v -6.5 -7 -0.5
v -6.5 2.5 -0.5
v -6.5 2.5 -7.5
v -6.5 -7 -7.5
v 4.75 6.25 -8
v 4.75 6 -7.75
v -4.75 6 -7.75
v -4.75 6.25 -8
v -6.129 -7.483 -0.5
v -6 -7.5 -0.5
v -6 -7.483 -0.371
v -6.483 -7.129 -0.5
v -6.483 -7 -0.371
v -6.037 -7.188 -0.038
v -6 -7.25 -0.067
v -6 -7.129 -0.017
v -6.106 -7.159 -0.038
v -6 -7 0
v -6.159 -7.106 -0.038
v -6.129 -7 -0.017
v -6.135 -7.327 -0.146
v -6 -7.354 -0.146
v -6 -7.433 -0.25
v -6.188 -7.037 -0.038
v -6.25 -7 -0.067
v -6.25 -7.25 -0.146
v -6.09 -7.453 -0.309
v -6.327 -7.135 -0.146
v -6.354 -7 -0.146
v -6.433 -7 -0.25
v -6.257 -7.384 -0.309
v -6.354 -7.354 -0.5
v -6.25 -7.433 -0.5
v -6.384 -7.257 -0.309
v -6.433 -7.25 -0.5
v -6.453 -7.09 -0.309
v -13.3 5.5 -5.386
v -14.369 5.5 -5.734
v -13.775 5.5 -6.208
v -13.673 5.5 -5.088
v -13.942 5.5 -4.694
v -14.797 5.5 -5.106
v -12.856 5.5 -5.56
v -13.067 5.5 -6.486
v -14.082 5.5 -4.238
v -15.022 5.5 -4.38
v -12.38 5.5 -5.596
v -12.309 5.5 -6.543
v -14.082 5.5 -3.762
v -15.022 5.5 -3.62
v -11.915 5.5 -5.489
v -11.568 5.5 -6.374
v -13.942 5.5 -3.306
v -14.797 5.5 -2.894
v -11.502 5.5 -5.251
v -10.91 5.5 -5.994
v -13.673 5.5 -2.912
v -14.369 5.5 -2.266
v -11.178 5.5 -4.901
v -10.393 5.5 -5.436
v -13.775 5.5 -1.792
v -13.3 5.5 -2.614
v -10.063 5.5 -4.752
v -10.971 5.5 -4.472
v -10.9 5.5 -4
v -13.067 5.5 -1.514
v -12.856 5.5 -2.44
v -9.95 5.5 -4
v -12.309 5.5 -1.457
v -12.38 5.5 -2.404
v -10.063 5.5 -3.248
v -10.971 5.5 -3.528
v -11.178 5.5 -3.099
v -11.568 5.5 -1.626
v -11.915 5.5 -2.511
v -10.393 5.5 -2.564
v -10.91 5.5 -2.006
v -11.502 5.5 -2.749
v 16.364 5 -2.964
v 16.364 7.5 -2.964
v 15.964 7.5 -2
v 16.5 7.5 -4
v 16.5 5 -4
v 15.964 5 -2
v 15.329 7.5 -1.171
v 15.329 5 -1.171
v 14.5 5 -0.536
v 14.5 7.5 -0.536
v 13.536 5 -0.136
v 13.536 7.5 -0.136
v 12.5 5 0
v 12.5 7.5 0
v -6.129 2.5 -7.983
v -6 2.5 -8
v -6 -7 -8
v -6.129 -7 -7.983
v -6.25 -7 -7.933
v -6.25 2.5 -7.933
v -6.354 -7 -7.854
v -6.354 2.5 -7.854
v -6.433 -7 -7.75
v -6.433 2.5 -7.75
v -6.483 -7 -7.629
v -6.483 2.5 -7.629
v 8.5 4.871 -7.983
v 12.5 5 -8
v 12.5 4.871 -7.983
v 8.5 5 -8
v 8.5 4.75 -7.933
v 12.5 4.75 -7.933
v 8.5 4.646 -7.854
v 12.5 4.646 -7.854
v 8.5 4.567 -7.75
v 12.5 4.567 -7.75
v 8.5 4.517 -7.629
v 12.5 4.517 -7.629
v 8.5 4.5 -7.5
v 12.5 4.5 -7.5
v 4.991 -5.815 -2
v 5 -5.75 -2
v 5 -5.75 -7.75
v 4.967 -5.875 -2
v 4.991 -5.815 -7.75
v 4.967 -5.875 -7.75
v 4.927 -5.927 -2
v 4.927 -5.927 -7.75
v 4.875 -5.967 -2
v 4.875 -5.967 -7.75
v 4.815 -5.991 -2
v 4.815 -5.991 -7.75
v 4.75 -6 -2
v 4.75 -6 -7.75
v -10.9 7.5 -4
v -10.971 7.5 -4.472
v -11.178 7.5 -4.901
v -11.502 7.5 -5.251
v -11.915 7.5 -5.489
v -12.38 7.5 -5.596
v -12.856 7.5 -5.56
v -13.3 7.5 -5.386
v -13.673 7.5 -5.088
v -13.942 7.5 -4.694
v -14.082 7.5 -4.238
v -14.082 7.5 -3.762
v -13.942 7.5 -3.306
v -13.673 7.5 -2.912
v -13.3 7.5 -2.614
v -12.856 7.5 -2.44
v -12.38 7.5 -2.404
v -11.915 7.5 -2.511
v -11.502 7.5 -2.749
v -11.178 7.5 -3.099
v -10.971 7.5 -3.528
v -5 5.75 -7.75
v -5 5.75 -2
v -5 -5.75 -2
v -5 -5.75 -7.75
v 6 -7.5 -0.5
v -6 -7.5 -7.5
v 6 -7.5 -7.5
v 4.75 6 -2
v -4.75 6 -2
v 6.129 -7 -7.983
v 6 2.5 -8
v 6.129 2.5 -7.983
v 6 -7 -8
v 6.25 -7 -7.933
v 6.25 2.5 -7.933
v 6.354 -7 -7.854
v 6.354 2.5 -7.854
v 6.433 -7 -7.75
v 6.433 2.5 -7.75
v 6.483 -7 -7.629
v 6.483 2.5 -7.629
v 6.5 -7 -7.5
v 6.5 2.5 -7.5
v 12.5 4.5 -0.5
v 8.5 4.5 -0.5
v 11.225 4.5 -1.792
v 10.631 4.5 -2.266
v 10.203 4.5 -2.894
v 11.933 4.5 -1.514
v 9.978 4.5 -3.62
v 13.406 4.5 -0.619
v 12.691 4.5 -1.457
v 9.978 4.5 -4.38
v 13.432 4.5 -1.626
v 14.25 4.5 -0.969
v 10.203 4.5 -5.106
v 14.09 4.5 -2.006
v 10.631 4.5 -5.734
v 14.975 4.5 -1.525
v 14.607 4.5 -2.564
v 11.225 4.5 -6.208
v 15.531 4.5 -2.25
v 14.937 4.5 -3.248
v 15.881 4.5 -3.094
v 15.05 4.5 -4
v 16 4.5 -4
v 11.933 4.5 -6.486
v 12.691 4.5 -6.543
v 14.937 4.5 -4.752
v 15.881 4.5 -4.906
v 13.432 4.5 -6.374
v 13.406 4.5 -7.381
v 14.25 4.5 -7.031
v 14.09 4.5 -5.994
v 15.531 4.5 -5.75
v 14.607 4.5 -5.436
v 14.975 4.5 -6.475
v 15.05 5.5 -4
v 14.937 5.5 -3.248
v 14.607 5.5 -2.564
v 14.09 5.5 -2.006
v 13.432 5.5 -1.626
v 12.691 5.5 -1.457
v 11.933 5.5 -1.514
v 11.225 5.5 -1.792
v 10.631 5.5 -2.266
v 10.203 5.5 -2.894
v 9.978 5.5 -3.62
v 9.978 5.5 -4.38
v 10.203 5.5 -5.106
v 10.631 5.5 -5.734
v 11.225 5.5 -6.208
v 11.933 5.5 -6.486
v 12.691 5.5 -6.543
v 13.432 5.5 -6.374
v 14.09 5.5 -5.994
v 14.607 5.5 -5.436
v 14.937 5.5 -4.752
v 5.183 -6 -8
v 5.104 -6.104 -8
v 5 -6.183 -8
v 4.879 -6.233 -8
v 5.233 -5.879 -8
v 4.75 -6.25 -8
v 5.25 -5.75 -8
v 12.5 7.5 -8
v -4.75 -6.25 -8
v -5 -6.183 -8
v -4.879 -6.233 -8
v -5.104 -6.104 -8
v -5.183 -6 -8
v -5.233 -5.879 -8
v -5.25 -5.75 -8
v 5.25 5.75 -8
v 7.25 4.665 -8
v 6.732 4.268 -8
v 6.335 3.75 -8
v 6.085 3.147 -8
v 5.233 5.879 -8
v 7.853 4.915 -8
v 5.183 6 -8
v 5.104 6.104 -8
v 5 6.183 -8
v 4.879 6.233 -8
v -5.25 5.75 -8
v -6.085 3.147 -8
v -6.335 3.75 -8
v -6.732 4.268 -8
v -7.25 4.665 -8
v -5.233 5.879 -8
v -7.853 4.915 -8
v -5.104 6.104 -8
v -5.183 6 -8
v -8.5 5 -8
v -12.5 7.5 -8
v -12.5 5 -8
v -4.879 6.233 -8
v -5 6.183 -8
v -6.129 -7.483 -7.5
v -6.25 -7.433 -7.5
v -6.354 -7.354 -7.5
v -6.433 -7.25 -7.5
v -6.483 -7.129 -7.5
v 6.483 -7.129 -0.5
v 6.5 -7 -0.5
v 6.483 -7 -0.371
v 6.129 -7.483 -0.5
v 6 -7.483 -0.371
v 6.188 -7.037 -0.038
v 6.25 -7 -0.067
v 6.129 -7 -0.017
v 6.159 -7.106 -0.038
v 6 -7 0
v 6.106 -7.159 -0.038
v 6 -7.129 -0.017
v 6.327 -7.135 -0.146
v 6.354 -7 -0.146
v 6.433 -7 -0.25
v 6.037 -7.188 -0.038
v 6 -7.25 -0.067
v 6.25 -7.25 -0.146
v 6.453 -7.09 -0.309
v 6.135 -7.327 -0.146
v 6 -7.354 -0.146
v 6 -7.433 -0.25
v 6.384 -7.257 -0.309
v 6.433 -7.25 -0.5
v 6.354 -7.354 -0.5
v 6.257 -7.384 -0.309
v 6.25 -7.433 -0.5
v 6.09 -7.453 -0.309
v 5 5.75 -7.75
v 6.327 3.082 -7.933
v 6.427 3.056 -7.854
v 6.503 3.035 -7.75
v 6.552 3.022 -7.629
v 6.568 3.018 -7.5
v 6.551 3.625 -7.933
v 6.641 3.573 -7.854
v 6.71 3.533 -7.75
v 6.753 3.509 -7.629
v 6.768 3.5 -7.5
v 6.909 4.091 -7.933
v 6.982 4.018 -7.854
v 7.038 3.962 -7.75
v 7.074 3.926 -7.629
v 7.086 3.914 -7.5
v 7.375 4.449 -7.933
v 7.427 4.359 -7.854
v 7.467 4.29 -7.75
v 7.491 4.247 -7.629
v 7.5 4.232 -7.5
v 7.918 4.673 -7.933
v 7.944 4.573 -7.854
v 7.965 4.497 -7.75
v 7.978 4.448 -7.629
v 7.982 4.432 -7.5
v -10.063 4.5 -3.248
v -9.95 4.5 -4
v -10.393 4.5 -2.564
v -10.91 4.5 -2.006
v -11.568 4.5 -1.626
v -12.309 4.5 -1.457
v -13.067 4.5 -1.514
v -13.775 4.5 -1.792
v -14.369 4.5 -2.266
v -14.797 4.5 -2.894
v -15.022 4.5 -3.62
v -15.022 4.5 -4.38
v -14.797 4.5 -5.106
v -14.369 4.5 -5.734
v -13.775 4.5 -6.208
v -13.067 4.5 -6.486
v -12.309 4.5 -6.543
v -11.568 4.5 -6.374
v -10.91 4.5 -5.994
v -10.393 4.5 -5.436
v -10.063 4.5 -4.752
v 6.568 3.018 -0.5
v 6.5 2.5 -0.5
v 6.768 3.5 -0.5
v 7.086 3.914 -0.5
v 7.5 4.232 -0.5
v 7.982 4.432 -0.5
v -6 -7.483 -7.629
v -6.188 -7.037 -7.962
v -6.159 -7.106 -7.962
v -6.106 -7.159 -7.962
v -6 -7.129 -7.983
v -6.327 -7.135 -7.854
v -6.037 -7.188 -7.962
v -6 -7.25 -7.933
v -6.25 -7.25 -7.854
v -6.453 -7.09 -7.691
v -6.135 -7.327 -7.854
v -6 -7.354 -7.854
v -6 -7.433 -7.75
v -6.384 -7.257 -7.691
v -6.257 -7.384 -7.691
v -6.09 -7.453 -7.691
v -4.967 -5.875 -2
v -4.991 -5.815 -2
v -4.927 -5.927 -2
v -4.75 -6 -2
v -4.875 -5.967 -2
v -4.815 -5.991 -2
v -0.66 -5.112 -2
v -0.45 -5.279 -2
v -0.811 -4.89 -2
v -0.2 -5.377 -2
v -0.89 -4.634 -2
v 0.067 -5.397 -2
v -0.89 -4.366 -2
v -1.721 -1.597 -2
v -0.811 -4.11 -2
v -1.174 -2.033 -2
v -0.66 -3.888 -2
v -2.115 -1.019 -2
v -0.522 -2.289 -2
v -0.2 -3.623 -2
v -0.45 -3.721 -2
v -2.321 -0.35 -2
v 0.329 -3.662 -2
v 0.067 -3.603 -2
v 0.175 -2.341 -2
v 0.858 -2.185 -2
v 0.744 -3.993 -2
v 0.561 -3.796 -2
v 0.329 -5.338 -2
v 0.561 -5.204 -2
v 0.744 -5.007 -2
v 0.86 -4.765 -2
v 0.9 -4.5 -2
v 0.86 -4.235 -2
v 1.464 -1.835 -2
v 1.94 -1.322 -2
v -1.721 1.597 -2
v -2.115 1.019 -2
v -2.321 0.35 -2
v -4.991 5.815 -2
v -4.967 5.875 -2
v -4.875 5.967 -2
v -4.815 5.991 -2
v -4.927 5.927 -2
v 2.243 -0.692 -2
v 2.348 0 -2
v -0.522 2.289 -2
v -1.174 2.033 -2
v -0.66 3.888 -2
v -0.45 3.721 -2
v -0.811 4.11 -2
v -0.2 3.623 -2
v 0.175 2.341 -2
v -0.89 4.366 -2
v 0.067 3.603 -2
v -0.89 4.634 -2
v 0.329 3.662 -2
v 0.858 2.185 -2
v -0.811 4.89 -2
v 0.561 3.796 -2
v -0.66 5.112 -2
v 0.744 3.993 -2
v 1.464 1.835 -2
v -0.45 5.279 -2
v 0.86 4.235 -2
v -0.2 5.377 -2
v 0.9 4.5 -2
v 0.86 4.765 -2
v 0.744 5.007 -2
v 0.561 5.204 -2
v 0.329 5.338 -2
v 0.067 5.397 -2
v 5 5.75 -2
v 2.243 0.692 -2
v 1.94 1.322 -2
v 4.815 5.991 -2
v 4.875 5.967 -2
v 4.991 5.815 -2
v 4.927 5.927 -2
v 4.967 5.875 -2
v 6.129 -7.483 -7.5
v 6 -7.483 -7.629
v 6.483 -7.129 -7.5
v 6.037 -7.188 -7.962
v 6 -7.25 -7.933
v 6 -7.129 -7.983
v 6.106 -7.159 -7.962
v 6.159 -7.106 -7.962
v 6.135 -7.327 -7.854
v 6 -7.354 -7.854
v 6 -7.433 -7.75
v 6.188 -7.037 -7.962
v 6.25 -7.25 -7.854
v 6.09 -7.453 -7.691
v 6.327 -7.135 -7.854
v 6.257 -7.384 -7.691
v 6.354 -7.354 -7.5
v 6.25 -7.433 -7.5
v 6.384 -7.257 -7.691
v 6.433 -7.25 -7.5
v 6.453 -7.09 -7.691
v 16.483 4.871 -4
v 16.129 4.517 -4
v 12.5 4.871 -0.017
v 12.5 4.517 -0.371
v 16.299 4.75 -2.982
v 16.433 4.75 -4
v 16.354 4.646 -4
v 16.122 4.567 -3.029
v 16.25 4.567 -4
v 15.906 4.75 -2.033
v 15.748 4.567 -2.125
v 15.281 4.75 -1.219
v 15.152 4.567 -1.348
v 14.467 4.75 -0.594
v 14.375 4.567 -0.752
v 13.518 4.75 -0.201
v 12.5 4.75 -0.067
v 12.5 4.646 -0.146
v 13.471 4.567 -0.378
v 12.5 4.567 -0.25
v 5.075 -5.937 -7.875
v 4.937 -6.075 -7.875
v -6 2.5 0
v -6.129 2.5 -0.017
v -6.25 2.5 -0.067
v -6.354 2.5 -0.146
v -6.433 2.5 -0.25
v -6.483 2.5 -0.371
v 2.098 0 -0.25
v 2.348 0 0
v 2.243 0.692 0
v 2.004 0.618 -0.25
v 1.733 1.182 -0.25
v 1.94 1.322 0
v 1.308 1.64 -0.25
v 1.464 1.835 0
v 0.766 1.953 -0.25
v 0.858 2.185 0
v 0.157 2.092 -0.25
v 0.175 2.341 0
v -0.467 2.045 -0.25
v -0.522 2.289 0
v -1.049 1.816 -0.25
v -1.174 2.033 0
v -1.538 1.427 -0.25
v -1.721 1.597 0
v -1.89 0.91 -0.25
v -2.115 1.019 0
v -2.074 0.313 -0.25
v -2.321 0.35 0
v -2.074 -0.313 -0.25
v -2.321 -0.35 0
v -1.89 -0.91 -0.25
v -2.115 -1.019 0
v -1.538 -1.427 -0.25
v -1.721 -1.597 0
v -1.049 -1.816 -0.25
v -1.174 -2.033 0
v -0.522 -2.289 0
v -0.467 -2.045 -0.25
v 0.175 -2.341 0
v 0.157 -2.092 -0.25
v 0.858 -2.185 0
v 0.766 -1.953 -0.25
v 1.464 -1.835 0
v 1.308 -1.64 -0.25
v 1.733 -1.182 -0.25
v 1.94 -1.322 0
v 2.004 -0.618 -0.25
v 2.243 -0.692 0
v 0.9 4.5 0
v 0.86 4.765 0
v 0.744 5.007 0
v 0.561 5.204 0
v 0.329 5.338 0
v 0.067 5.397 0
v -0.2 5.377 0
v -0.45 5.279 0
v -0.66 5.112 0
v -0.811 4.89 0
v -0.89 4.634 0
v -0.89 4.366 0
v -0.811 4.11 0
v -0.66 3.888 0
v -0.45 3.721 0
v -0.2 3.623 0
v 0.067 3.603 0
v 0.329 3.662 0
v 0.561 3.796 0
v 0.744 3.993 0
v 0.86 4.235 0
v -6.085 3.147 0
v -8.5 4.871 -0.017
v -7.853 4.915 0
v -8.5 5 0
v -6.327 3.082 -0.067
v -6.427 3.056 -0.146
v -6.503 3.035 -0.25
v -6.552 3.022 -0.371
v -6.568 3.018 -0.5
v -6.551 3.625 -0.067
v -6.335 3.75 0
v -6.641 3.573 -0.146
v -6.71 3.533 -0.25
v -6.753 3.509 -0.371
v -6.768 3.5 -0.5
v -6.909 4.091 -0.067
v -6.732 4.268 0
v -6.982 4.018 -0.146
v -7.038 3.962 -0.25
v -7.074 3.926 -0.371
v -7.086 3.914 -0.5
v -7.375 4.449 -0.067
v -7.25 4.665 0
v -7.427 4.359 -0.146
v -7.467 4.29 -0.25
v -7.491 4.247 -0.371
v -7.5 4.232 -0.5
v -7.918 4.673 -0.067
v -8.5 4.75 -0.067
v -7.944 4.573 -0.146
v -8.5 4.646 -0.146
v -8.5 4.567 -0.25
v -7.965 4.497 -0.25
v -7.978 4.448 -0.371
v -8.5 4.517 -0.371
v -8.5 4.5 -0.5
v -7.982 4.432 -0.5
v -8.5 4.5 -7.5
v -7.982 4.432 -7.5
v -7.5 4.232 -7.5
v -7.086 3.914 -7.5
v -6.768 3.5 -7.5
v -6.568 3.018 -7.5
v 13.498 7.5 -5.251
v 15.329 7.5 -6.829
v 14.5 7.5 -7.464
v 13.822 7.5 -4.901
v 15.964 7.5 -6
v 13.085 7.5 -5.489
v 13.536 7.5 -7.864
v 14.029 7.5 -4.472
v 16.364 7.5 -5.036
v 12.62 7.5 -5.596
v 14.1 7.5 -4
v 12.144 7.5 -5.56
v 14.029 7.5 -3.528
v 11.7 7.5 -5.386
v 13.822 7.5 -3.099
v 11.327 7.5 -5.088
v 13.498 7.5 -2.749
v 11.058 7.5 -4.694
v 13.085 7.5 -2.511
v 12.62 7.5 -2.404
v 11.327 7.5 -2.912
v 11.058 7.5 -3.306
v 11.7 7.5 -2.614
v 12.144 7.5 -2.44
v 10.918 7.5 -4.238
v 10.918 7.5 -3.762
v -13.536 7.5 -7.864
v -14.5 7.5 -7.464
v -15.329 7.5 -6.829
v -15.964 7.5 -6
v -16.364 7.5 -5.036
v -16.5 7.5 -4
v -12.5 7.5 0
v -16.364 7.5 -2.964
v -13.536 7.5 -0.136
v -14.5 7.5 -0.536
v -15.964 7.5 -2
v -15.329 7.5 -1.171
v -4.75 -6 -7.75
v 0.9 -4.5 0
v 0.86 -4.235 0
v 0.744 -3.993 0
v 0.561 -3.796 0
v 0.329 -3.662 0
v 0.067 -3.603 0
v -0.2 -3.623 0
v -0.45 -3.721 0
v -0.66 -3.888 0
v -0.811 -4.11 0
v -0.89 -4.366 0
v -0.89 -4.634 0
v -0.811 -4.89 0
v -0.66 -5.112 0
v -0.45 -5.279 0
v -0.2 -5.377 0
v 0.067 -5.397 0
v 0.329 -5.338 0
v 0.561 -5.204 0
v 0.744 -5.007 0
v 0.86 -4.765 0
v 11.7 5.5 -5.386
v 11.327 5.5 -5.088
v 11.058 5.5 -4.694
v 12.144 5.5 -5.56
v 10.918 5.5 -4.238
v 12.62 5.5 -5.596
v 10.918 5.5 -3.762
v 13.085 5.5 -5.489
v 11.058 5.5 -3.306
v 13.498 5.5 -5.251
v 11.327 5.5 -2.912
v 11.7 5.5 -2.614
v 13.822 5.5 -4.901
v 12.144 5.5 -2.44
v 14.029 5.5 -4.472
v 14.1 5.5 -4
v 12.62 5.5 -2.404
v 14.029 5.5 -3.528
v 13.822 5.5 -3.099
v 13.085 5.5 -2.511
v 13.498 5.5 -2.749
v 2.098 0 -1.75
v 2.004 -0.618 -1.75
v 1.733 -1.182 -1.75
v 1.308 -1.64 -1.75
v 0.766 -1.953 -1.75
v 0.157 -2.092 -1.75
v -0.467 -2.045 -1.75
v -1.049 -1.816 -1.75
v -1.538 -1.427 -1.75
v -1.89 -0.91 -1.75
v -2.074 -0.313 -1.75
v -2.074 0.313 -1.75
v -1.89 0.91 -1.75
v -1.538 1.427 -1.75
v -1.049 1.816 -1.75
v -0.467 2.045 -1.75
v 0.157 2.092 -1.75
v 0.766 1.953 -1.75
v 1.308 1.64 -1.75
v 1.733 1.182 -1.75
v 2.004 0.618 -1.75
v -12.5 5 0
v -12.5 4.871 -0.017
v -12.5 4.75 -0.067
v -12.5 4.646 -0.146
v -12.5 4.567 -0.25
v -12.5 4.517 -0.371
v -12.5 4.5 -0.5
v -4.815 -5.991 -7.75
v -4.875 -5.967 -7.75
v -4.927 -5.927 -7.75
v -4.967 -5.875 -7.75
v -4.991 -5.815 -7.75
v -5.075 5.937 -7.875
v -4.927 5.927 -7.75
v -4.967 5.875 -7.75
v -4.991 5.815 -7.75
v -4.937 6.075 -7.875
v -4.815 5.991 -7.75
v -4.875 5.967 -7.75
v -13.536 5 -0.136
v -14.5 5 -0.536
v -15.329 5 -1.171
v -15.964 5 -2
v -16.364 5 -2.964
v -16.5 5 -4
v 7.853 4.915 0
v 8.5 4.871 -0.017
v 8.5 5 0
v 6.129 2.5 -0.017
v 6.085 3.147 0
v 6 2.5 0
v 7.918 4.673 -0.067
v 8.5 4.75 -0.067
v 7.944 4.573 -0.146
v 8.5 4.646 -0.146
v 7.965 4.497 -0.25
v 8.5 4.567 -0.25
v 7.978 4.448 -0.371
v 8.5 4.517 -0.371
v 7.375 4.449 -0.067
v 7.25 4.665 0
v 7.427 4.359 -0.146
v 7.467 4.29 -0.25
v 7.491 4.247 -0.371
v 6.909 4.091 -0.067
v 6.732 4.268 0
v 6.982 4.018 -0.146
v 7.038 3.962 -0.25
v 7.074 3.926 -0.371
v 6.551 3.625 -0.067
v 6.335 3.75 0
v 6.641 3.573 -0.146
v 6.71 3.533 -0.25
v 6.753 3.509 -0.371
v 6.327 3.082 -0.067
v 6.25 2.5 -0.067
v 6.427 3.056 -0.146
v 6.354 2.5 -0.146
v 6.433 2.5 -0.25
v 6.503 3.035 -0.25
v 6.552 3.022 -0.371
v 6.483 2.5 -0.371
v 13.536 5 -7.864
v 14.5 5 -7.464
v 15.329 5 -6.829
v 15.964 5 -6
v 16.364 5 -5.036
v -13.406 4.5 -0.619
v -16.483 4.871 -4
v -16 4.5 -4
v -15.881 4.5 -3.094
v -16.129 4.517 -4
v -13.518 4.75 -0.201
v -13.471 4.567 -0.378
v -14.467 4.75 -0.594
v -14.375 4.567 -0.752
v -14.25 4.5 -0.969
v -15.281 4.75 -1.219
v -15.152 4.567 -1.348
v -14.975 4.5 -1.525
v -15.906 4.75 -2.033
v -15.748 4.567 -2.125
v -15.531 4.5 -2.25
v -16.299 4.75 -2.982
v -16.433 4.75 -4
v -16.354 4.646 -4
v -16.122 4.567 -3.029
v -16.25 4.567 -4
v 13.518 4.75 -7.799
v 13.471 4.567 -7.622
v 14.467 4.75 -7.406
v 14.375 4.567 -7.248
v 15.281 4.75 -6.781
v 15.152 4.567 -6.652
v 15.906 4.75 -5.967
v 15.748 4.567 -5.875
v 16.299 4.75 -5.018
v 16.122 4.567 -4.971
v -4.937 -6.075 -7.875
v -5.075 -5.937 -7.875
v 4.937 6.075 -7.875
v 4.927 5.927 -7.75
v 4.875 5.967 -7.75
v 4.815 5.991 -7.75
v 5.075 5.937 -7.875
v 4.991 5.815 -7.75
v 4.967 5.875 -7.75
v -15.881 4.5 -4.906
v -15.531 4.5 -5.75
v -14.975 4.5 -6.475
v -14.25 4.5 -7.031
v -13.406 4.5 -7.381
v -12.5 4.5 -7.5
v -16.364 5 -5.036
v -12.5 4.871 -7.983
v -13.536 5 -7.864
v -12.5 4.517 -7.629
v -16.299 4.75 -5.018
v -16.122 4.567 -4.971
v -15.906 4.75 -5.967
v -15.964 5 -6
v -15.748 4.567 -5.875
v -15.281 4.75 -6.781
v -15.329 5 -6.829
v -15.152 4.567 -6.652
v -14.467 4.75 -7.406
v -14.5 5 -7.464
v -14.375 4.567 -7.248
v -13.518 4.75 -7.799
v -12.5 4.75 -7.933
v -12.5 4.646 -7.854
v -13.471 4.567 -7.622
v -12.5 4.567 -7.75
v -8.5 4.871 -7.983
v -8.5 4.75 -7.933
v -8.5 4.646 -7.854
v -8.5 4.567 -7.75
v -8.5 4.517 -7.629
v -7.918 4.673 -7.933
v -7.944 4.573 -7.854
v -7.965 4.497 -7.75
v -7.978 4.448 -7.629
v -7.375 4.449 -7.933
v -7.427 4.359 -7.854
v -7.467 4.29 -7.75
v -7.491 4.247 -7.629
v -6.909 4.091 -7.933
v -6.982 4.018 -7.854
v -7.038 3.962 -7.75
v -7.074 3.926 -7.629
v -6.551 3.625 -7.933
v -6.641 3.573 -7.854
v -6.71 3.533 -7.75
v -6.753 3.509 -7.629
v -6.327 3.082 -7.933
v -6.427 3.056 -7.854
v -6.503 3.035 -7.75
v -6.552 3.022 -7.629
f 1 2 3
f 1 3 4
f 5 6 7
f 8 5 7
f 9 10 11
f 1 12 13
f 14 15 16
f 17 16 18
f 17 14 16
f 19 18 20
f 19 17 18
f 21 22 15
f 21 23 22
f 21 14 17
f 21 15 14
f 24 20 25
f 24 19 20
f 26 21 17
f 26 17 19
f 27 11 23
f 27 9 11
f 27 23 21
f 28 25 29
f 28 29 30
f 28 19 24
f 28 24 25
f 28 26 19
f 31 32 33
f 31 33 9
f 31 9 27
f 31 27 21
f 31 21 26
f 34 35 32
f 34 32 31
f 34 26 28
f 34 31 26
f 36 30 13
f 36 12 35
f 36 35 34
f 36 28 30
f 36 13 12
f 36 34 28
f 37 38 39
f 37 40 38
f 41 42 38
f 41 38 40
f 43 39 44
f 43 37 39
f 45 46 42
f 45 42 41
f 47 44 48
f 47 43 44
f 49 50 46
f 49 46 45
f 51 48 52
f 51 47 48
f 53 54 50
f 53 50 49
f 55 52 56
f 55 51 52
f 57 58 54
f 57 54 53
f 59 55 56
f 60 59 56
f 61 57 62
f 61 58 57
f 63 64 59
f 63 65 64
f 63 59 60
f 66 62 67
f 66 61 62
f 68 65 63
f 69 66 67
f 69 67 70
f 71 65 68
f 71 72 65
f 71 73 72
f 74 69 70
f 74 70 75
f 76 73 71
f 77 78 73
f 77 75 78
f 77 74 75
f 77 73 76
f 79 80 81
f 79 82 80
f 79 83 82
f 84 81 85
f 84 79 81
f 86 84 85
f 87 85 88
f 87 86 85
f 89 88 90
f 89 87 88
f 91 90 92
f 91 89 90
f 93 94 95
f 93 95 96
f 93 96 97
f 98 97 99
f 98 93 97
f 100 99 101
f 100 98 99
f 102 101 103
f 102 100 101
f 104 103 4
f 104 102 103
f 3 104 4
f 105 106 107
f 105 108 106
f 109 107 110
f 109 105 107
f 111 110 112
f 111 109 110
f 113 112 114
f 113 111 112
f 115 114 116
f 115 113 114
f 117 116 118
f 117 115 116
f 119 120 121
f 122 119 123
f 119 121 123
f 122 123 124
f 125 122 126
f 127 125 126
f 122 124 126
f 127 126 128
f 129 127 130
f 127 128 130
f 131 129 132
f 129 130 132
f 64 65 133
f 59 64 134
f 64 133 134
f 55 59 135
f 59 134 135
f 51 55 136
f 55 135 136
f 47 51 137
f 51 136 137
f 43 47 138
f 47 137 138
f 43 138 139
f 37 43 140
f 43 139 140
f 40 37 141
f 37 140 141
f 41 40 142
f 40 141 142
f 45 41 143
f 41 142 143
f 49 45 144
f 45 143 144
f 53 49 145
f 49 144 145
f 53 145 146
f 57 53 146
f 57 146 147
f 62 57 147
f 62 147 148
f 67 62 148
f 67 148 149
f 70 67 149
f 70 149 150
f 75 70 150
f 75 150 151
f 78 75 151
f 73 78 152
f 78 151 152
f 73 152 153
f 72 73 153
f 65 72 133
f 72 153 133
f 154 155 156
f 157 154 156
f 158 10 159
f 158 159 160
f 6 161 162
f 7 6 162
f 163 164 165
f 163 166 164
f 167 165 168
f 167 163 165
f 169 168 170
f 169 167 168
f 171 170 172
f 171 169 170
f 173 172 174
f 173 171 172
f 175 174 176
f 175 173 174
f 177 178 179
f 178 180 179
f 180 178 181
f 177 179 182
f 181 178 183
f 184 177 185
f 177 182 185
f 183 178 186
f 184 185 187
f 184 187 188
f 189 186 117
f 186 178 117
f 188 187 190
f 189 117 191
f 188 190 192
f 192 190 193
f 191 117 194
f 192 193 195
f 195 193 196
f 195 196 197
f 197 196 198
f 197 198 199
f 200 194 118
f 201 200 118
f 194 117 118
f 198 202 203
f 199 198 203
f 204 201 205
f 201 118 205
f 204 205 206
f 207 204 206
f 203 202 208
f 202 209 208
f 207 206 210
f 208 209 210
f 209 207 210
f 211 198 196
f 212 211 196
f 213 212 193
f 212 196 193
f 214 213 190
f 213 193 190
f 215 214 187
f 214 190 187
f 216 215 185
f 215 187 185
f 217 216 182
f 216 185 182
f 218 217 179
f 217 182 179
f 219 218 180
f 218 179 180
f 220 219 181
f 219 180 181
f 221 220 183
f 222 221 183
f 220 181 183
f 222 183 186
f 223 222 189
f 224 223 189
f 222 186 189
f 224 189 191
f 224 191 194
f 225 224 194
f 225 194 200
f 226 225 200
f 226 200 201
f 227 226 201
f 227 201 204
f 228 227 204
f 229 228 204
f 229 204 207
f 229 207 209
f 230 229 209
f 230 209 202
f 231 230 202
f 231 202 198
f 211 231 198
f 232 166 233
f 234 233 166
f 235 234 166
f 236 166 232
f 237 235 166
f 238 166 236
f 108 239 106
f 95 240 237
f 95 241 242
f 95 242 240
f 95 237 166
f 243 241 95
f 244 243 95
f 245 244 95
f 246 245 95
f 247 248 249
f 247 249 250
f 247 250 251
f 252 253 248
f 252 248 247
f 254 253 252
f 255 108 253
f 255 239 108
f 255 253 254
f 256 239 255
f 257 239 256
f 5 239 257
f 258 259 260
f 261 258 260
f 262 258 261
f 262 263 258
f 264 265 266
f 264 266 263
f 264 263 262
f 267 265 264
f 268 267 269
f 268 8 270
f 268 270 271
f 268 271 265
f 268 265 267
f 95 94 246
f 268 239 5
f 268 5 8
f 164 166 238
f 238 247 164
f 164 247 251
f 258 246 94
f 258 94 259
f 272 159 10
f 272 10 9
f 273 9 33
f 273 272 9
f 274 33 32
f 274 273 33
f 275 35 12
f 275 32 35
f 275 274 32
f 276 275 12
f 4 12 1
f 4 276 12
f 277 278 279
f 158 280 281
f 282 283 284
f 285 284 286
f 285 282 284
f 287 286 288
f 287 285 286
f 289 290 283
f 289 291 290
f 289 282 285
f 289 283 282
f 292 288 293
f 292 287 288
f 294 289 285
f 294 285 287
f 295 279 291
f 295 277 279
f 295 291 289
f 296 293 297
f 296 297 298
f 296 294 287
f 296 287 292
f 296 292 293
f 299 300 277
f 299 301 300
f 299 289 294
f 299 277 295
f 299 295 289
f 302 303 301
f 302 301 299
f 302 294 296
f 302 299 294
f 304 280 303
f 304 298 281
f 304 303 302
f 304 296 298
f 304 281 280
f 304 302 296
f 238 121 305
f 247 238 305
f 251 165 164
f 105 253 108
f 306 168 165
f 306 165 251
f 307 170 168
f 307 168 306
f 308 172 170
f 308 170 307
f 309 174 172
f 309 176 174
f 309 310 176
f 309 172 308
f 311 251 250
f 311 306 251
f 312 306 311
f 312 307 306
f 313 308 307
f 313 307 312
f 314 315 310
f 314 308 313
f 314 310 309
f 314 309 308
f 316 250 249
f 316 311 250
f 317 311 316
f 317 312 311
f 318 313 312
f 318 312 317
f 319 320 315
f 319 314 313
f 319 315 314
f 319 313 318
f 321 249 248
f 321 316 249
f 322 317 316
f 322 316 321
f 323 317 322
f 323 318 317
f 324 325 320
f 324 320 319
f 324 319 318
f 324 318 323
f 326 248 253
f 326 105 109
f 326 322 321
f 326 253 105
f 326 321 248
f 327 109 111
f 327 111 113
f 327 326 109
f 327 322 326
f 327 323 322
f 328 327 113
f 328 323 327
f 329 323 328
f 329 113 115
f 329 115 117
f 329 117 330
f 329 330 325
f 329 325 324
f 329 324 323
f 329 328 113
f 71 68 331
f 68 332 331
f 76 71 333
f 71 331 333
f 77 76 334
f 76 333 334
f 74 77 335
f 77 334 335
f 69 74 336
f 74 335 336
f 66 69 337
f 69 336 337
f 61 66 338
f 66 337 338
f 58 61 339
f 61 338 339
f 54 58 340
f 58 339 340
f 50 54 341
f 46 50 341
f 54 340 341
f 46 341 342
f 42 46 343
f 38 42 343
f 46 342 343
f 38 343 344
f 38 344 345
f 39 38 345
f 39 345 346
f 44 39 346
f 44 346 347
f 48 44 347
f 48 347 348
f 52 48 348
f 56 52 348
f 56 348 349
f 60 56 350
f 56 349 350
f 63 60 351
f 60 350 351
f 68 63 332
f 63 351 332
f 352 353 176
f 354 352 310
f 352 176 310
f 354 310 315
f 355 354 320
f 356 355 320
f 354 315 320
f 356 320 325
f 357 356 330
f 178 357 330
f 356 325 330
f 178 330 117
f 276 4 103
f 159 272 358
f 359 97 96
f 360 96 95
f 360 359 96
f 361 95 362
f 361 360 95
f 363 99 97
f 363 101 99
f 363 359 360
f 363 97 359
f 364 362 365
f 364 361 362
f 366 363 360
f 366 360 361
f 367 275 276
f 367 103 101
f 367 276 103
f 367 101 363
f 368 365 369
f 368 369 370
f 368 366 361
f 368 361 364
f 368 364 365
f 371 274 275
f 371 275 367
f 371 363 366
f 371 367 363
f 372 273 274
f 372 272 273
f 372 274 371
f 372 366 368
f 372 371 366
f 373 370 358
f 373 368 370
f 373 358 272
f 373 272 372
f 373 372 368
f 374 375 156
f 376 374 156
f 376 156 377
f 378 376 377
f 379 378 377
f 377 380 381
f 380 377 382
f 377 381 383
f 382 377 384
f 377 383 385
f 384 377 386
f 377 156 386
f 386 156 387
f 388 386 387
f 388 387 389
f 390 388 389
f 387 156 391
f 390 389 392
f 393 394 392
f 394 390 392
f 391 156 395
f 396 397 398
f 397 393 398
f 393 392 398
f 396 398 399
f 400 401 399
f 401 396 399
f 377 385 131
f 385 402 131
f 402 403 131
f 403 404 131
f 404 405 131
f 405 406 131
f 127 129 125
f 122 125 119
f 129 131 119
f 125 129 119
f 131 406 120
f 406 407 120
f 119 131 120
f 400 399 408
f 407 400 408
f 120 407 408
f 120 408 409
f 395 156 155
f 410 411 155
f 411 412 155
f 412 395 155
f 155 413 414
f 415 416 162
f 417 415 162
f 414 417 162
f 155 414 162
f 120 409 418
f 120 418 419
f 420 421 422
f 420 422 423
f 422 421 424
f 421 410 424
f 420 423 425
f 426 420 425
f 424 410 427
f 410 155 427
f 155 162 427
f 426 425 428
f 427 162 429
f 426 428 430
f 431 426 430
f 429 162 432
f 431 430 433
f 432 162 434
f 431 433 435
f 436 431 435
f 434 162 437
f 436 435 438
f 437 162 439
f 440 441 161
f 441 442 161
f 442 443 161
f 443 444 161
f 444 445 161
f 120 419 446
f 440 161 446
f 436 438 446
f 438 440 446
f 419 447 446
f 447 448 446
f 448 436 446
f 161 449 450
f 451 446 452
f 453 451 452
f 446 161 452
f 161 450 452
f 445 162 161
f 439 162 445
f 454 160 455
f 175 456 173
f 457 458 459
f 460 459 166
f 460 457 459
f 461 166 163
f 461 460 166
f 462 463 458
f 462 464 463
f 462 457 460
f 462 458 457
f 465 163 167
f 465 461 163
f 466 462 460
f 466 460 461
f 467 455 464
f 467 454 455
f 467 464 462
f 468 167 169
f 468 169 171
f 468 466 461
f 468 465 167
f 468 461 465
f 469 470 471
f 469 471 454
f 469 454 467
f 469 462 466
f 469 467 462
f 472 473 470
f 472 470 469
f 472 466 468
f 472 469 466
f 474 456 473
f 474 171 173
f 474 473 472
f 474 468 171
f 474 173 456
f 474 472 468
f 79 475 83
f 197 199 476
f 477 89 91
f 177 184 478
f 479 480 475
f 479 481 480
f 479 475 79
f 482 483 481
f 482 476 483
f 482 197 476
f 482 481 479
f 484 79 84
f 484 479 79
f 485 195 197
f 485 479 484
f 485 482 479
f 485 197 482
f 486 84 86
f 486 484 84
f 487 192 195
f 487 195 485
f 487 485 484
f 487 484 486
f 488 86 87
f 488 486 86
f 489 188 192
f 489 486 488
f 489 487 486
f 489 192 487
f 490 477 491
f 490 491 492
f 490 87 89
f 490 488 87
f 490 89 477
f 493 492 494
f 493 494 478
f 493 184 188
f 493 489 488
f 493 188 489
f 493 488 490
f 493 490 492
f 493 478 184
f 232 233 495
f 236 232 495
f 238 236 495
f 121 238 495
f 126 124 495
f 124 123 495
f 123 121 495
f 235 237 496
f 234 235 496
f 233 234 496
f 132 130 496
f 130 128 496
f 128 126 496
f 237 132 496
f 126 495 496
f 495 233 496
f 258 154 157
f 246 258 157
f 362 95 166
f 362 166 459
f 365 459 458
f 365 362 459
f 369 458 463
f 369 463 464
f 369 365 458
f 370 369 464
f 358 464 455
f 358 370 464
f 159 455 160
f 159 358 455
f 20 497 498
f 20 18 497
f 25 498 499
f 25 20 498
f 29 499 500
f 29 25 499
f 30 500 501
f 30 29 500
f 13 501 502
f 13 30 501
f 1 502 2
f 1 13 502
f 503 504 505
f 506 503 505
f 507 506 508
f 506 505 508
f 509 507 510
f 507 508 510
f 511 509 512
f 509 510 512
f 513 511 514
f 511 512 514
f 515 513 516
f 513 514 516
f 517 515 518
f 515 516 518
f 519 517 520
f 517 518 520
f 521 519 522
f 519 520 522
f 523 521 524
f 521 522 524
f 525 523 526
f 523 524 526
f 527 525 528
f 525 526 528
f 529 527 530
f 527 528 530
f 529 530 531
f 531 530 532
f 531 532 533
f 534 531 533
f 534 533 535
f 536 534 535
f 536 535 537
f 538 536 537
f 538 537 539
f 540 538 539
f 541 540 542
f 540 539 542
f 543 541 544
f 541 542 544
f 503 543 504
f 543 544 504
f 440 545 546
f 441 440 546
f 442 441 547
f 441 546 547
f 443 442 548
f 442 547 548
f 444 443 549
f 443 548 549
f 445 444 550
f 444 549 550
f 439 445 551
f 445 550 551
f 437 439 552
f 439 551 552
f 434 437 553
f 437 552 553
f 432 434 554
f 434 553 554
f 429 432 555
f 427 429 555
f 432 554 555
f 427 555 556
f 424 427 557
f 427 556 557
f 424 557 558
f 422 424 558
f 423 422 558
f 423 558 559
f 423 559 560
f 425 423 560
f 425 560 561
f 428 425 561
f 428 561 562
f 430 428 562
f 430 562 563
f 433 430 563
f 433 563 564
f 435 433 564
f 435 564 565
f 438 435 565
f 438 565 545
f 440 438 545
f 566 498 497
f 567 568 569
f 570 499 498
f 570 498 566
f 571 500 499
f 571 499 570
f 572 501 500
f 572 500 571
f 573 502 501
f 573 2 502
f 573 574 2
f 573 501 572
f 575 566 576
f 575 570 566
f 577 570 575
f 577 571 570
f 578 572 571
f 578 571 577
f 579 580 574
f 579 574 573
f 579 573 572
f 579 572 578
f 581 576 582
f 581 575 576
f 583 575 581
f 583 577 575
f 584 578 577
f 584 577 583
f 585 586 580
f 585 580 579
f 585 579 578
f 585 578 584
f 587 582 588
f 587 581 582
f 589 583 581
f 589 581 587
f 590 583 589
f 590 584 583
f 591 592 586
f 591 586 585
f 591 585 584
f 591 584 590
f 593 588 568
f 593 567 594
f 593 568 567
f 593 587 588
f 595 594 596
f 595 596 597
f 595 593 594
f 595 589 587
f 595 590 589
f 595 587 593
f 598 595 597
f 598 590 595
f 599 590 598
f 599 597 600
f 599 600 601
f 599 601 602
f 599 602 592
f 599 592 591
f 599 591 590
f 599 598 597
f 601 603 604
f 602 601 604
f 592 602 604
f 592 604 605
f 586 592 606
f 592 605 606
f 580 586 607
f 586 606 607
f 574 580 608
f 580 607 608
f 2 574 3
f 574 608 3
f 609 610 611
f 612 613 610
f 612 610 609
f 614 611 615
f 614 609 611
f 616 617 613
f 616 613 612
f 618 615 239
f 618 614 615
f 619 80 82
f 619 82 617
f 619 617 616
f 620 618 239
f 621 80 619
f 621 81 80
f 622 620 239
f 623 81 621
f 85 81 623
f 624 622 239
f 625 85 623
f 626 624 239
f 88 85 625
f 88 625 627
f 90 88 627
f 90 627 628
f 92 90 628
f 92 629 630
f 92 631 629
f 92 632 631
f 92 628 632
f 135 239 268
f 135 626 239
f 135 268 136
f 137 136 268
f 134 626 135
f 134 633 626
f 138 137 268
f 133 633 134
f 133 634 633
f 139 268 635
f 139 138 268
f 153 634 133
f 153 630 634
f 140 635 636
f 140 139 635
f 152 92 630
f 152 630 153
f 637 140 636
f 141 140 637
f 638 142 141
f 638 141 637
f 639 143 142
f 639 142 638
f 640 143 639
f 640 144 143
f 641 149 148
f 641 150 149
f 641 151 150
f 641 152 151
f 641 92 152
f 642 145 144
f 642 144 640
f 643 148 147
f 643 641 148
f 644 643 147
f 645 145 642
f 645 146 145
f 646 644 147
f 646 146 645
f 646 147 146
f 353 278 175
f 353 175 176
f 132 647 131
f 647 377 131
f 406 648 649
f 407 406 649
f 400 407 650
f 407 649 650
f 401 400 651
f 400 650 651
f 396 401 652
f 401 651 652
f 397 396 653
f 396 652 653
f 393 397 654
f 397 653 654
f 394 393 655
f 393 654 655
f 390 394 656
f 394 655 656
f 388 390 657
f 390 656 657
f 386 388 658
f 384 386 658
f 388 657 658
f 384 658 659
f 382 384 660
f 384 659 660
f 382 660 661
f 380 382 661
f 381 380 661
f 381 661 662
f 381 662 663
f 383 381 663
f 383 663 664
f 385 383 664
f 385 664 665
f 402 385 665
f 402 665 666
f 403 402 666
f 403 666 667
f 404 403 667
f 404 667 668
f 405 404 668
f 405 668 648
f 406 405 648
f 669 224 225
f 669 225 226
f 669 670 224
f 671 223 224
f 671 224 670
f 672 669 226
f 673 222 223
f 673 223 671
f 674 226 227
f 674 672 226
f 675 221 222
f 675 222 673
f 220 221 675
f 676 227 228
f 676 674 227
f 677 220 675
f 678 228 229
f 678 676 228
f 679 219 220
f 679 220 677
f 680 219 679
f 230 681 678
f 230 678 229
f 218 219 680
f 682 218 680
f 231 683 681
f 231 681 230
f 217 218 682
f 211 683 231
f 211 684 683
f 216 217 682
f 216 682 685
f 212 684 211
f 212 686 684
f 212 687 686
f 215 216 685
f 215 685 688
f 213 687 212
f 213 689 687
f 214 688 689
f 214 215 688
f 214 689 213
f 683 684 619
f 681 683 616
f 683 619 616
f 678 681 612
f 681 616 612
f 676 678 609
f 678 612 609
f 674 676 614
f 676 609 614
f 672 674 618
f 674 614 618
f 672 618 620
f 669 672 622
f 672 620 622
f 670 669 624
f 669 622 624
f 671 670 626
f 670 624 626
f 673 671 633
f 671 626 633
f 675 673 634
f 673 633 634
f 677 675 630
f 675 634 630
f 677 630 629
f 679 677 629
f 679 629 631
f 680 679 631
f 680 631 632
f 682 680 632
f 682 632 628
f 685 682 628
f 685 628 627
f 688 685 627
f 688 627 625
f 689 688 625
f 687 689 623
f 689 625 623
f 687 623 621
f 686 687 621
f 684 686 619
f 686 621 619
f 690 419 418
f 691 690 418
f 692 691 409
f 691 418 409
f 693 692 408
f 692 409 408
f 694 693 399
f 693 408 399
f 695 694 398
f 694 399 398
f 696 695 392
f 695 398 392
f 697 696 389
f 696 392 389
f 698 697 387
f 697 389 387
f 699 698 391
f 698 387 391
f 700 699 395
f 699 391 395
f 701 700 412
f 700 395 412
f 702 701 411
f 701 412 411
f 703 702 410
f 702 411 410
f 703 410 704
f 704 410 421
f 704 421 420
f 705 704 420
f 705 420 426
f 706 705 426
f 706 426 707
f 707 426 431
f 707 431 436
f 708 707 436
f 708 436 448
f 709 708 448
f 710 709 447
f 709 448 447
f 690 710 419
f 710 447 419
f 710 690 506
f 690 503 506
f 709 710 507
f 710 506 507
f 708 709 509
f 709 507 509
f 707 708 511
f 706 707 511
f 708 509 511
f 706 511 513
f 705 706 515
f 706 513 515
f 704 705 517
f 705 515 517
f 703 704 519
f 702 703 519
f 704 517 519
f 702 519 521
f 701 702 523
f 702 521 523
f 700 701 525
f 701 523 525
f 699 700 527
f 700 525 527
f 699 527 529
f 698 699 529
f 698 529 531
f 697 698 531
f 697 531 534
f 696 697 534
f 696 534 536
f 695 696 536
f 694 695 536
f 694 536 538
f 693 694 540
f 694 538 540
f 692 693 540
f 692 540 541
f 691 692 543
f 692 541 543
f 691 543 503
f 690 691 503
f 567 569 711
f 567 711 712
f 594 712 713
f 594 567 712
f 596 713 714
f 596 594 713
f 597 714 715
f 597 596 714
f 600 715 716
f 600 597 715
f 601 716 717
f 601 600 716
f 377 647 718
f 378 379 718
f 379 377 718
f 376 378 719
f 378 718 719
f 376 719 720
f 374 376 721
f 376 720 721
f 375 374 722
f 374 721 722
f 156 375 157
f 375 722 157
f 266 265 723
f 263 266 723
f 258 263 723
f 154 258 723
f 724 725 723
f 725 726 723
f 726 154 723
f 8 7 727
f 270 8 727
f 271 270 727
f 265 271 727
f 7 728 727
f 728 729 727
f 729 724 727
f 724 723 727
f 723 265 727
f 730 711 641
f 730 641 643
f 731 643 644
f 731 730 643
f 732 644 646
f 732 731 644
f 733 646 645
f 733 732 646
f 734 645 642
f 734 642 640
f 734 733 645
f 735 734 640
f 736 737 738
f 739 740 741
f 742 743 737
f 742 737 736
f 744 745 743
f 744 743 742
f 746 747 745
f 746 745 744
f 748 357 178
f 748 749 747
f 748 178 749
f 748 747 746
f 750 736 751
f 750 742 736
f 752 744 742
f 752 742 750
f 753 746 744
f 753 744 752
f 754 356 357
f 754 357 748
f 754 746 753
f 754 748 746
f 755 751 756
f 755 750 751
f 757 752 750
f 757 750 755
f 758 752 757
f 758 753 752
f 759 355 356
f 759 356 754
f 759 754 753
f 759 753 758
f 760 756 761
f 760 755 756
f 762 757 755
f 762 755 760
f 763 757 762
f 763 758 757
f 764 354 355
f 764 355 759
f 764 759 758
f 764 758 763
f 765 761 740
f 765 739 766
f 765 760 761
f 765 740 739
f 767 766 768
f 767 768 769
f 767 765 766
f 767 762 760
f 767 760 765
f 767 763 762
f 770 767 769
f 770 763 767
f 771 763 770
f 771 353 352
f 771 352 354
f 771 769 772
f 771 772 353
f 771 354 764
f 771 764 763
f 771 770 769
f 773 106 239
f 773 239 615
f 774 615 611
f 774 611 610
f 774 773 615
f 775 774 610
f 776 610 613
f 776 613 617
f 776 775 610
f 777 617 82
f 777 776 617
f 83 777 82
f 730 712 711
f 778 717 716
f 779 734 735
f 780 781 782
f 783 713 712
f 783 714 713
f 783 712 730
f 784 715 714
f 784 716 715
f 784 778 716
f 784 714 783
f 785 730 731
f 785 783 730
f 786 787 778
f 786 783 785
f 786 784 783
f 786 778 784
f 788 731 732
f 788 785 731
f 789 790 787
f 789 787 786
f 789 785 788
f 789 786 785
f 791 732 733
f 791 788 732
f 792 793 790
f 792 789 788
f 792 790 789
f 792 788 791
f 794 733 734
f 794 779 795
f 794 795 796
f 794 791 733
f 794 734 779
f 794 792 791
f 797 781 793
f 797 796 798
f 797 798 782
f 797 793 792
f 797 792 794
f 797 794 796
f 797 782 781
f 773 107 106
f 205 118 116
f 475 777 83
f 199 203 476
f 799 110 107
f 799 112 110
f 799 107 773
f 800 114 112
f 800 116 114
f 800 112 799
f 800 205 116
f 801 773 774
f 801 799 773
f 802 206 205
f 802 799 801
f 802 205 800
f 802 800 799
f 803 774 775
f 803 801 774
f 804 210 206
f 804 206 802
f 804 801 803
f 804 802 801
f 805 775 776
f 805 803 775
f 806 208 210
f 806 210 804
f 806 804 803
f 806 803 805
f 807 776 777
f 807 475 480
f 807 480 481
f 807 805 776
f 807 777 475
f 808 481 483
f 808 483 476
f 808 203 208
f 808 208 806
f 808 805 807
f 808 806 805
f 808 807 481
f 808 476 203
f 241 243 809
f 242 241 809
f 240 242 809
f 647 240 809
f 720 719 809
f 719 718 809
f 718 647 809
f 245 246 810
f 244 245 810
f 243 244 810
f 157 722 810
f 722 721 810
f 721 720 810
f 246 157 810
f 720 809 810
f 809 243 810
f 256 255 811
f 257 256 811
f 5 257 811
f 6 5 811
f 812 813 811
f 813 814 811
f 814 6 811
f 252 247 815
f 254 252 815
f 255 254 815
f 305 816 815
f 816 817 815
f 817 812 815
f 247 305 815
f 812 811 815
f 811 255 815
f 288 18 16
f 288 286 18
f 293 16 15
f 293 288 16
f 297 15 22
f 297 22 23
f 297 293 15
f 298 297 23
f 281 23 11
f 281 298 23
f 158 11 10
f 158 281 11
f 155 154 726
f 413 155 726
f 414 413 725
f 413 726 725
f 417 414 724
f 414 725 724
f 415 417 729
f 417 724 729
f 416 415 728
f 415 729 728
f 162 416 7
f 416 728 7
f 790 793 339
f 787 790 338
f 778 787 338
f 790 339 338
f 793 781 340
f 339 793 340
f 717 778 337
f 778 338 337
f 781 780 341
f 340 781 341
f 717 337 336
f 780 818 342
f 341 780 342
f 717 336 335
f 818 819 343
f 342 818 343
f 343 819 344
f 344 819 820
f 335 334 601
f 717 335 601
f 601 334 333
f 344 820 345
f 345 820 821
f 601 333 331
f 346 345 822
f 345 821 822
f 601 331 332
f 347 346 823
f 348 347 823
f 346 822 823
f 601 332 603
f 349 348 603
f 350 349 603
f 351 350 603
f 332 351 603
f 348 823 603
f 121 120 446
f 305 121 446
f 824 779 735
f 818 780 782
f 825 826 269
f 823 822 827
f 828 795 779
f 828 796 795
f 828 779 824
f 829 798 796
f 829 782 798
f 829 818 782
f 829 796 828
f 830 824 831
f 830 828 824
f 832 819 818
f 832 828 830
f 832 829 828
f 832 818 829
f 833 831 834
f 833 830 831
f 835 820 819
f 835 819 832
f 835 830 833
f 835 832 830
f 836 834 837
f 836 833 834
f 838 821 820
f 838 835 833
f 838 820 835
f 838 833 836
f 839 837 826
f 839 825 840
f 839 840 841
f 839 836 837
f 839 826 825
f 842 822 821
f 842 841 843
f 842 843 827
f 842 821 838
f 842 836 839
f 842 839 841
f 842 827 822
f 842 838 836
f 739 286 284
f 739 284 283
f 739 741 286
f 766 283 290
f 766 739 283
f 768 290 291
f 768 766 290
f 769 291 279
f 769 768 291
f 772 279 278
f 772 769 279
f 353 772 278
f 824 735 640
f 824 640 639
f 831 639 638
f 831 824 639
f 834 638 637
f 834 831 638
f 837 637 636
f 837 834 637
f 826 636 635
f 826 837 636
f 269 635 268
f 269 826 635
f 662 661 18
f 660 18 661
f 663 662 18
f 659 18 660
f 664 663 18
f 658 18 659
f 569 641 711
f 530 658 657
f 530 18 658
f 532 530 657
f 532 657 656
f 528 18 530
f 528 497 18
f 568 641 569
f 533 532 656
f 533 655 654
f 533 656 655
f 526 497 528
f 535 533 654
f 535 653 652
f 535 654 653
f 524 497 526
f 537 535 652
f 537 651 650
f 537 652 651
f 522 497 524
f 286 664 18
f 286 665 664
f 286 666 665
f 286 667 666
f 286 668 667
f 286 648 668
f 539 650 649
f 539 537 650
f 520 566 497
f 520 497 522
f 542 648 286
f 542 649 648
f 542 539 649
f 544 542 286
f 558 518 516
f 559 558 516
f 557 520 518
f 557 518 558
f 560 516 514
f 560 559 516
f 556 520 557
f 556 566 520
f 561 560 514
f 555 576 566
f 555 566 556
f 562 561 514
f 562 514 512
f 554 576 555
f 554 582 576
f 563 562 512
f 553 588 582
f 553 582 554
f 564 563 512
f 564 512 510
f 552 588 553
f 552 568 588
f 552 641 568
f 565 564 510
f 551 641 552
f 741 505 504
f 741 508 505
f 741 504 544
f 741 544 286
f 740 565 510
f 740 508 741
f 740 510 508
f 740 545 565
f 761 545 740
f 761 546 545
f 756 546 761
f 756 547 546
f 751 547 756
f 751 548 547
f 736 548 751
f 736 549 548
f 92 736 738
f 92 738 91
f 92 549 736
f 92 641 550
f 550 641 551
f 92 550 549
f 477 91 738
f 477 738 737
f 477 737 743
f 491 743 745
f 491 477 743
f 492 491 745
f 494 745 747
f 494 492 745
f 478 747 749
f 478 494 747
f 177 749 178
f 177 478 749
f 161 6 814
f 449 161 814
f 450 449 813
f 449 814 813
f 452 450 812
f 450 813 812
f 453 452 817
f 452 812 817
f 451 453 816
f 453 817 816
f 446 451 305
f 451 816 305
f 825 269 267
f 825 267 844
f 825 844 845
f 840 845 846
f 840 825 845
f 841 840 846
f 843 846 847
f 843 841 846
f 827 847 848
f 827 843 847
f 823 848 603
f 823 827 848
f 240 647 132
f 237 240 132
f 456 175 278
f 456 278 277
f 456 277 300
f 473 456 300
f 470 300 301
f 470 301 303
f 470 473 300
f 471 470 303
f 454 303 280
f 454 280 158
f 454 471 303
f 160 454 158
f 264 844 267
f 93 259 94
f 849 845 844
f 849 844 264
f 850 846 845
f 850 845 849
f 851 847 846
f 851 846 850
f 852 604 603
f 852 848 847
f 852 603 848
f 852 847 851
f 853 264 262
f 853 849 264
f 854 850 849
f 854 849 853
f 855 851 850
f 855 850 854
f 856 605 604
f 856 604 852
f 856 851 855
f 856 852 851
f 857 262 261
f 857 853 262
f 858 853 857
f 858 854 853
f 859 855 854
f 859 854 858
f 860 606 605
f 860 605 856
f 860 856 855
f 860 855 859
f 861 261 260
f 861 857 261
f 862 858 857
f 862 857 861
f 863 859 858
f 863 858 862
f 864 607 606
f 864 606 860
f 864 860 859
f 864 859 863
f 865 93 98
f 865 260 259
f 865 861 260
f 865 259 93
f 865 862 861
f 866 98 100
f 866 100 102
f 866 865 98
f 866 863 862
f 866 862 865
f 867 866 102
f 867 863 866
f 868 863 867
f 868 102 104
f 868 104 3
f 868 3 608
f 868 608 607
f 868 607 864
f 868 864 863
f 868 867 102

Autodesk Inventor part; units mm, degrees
ref_plane "YZ Plane" through (0, 0, 0) normal (1, 0, 0) x (0, 1, 0)
ref_plane "XZ Plane" through (0, 0, 0) normal (0, 1, 0) x (-1, 0, 0)
ref_plane "XY Plane" through (0, 0, 0) normal (0, 0, 1) x (1, 0, 0)
sketch "Sketch1" plane through (0, 0, 0) normal (0, 1, 0) x (-1, 0, 0)
  point P0 (0, 0)
sketch "Sketch2" plane through (0, 0, 0) normal (0, 0, 1) x (1, 0, 0)
  circle A0 centre (0, -4.5) radius 0.9
  circle A1 centre (0, 4.5) radius 0.9
  circle A2 centre (0, 0) radius 2.0975
  line L0 (6.5, 7.5) -> (-6.5, 7.5)
  line L1 (-6.5, 7.5) -> (-6.5, -7.5)
  line L2 (-6.5, -7.5) -> (6.5, -7.5)
  line L3 (6.5, -7.5) -> (6.5, 7.5)
  dimension "d0" = 1.8
  dimension "d1" = 9
  dimension "d2" = 4.195
  dimension "d3" = 4.5
  dimension "d4" = 13
  dimension "d5" = 15
  dimension "d6" = 7.5
  dimension "d7" = 6.5
extrude "Extrusion1" add sketch "Sketch2" against normal blind 2
sketch "Sketch3" plane through (0, 0, -2) normal (0, 0, -1) x (-1, 0, 0)
  line L0 (6.5, 7.5) -> (-6.5, 7.5) projected
  line L1 (-6.5, 7.5) -> (-6.5, -7.5) projected
  line L2 (6.5, -7.5) -> (6.5, 7.5) projected
  line L3 (-6.5, -7.5) -> (6.5, -7.5) projected
  line L4 (-5, 6) -> (5, 6)
  line L5 (5, 6) -> (5, -6)
  line L6 (5, -6) -> (-5, -6)
  line L7 (-5, -6) -> (-5, 6)
  point P0 (0, 0)
  dimension "d10" = 1.5
  dimension "d11" = 1.5
  dimension "d12" = 1.5
  dimension "d13" = 1.5
extrude "Extrusion2" add sketch "Sketch3" along normal blind 6
sketch "Sketch4" plane through (-6.5, 7.5, 0) normal (0, 1, 0) x (1, 0, 0)
  line L0 (13, 8) -> (0, 8) projected
  line L1 (0, 8) -> (-10, 8)
  line L2 (-10, 8) -> (-10, 0)
  line L3 (0, 0) -> (13, 0) projected
  line L4 (-10, 0) -> (0, 0)
  line L5 (13, 0) -> (23, 0)
  line L6 (23, 0) -> (23, 8)
  line L7 (23, 8) -> (13, 8)
  line L8 (0, 0) -> (0, 8) projected
  line L9 (13, 0) -> (13, 8) projected
  circle A0 centre (-6, 4) radius 1.6
  circle A1 centre (19, 4) radius 1.6
  point P0 (6.5, 0)
  point P1 (-10, 4)
  point P2 (-5, 0)
  point P3 (18, 0)
  dimension "d16" = 3.2
  dimension "d17" = 10
  dimension "d22" = 4
  dimension "d23" = 4
extrude "Extrusion3" add sketch "Sketch4" against normal blind 3 contours L7 L6 L5 L9 | L8 L4 L2 L1
fillet "Fillet1" radius 2 2 edges at (-6.5, 4.5, -4) (6.5, 4.5, -4)
fillet "Fillet2" radius 4 4 edges at (-16.5, 6, 0) (-16.5, 6, -8) (16.5, 6, 0) (16.5, 6, -8)
sketch "Sketch5" plane through (-6.5, 4.5, 0) normal (0, -1, 0) x (1, 0, 0)
  circle A0 centre (19, -4) radius 1.6 projected
  circle A1 centre (-6, -4) radius 1.6 projected
  circle A2 centre (19, -4) radius 2.55
  circle A3 centre (-6, -4) radius 2.55
  point P0 (6.5, 0)
  dimension "d24" = 5.1
extrude "Extrusion4" cut sketch "Sketch5" against normal blind 1
fillet "Fillet3" radius 0.5 16 edges at (-6.5, -7.5, -4) (6.5, -7.5, -4) (-10.5002, 4.5, 0) (-15.3286, 4.5, -1.1714) (-16.5, 4.5, -4) (-10.5003, 4.5, -8) (-6.5, -2.5, -8) (-6.5, -2.5, 0) (10.5002, 4.5, 0) (15.3286, 4.5, -1.1714) (16.5, 4.5, -4) (10.5003, 4.5, -8) (6.5, -2.5, -8) (6.5, -2.5, 0) (0, -7.5, 0) (0, -7.5, -8)
fillet "Fillet4" radius 0.25 4 edges at (5, -6, -5) (-5, -6, -5) (5, 6, -5) (-5, 6, -5)
chamfer "Chamfer1" distance 0.25 angle 45 10 edges at (-2.0975, 0, -2) (-2.0975, 0, 0) (0, -6, -8) (4.9268, -5.9268, -8) (5, 0, -8) (4.9268, 5.9268, -8) (0, 6, -8) (-4.9268, 5.9268, -8) (-5, 0, -8) (-4.9268, -5.9268, -8)
properties part number "v2motormount"
